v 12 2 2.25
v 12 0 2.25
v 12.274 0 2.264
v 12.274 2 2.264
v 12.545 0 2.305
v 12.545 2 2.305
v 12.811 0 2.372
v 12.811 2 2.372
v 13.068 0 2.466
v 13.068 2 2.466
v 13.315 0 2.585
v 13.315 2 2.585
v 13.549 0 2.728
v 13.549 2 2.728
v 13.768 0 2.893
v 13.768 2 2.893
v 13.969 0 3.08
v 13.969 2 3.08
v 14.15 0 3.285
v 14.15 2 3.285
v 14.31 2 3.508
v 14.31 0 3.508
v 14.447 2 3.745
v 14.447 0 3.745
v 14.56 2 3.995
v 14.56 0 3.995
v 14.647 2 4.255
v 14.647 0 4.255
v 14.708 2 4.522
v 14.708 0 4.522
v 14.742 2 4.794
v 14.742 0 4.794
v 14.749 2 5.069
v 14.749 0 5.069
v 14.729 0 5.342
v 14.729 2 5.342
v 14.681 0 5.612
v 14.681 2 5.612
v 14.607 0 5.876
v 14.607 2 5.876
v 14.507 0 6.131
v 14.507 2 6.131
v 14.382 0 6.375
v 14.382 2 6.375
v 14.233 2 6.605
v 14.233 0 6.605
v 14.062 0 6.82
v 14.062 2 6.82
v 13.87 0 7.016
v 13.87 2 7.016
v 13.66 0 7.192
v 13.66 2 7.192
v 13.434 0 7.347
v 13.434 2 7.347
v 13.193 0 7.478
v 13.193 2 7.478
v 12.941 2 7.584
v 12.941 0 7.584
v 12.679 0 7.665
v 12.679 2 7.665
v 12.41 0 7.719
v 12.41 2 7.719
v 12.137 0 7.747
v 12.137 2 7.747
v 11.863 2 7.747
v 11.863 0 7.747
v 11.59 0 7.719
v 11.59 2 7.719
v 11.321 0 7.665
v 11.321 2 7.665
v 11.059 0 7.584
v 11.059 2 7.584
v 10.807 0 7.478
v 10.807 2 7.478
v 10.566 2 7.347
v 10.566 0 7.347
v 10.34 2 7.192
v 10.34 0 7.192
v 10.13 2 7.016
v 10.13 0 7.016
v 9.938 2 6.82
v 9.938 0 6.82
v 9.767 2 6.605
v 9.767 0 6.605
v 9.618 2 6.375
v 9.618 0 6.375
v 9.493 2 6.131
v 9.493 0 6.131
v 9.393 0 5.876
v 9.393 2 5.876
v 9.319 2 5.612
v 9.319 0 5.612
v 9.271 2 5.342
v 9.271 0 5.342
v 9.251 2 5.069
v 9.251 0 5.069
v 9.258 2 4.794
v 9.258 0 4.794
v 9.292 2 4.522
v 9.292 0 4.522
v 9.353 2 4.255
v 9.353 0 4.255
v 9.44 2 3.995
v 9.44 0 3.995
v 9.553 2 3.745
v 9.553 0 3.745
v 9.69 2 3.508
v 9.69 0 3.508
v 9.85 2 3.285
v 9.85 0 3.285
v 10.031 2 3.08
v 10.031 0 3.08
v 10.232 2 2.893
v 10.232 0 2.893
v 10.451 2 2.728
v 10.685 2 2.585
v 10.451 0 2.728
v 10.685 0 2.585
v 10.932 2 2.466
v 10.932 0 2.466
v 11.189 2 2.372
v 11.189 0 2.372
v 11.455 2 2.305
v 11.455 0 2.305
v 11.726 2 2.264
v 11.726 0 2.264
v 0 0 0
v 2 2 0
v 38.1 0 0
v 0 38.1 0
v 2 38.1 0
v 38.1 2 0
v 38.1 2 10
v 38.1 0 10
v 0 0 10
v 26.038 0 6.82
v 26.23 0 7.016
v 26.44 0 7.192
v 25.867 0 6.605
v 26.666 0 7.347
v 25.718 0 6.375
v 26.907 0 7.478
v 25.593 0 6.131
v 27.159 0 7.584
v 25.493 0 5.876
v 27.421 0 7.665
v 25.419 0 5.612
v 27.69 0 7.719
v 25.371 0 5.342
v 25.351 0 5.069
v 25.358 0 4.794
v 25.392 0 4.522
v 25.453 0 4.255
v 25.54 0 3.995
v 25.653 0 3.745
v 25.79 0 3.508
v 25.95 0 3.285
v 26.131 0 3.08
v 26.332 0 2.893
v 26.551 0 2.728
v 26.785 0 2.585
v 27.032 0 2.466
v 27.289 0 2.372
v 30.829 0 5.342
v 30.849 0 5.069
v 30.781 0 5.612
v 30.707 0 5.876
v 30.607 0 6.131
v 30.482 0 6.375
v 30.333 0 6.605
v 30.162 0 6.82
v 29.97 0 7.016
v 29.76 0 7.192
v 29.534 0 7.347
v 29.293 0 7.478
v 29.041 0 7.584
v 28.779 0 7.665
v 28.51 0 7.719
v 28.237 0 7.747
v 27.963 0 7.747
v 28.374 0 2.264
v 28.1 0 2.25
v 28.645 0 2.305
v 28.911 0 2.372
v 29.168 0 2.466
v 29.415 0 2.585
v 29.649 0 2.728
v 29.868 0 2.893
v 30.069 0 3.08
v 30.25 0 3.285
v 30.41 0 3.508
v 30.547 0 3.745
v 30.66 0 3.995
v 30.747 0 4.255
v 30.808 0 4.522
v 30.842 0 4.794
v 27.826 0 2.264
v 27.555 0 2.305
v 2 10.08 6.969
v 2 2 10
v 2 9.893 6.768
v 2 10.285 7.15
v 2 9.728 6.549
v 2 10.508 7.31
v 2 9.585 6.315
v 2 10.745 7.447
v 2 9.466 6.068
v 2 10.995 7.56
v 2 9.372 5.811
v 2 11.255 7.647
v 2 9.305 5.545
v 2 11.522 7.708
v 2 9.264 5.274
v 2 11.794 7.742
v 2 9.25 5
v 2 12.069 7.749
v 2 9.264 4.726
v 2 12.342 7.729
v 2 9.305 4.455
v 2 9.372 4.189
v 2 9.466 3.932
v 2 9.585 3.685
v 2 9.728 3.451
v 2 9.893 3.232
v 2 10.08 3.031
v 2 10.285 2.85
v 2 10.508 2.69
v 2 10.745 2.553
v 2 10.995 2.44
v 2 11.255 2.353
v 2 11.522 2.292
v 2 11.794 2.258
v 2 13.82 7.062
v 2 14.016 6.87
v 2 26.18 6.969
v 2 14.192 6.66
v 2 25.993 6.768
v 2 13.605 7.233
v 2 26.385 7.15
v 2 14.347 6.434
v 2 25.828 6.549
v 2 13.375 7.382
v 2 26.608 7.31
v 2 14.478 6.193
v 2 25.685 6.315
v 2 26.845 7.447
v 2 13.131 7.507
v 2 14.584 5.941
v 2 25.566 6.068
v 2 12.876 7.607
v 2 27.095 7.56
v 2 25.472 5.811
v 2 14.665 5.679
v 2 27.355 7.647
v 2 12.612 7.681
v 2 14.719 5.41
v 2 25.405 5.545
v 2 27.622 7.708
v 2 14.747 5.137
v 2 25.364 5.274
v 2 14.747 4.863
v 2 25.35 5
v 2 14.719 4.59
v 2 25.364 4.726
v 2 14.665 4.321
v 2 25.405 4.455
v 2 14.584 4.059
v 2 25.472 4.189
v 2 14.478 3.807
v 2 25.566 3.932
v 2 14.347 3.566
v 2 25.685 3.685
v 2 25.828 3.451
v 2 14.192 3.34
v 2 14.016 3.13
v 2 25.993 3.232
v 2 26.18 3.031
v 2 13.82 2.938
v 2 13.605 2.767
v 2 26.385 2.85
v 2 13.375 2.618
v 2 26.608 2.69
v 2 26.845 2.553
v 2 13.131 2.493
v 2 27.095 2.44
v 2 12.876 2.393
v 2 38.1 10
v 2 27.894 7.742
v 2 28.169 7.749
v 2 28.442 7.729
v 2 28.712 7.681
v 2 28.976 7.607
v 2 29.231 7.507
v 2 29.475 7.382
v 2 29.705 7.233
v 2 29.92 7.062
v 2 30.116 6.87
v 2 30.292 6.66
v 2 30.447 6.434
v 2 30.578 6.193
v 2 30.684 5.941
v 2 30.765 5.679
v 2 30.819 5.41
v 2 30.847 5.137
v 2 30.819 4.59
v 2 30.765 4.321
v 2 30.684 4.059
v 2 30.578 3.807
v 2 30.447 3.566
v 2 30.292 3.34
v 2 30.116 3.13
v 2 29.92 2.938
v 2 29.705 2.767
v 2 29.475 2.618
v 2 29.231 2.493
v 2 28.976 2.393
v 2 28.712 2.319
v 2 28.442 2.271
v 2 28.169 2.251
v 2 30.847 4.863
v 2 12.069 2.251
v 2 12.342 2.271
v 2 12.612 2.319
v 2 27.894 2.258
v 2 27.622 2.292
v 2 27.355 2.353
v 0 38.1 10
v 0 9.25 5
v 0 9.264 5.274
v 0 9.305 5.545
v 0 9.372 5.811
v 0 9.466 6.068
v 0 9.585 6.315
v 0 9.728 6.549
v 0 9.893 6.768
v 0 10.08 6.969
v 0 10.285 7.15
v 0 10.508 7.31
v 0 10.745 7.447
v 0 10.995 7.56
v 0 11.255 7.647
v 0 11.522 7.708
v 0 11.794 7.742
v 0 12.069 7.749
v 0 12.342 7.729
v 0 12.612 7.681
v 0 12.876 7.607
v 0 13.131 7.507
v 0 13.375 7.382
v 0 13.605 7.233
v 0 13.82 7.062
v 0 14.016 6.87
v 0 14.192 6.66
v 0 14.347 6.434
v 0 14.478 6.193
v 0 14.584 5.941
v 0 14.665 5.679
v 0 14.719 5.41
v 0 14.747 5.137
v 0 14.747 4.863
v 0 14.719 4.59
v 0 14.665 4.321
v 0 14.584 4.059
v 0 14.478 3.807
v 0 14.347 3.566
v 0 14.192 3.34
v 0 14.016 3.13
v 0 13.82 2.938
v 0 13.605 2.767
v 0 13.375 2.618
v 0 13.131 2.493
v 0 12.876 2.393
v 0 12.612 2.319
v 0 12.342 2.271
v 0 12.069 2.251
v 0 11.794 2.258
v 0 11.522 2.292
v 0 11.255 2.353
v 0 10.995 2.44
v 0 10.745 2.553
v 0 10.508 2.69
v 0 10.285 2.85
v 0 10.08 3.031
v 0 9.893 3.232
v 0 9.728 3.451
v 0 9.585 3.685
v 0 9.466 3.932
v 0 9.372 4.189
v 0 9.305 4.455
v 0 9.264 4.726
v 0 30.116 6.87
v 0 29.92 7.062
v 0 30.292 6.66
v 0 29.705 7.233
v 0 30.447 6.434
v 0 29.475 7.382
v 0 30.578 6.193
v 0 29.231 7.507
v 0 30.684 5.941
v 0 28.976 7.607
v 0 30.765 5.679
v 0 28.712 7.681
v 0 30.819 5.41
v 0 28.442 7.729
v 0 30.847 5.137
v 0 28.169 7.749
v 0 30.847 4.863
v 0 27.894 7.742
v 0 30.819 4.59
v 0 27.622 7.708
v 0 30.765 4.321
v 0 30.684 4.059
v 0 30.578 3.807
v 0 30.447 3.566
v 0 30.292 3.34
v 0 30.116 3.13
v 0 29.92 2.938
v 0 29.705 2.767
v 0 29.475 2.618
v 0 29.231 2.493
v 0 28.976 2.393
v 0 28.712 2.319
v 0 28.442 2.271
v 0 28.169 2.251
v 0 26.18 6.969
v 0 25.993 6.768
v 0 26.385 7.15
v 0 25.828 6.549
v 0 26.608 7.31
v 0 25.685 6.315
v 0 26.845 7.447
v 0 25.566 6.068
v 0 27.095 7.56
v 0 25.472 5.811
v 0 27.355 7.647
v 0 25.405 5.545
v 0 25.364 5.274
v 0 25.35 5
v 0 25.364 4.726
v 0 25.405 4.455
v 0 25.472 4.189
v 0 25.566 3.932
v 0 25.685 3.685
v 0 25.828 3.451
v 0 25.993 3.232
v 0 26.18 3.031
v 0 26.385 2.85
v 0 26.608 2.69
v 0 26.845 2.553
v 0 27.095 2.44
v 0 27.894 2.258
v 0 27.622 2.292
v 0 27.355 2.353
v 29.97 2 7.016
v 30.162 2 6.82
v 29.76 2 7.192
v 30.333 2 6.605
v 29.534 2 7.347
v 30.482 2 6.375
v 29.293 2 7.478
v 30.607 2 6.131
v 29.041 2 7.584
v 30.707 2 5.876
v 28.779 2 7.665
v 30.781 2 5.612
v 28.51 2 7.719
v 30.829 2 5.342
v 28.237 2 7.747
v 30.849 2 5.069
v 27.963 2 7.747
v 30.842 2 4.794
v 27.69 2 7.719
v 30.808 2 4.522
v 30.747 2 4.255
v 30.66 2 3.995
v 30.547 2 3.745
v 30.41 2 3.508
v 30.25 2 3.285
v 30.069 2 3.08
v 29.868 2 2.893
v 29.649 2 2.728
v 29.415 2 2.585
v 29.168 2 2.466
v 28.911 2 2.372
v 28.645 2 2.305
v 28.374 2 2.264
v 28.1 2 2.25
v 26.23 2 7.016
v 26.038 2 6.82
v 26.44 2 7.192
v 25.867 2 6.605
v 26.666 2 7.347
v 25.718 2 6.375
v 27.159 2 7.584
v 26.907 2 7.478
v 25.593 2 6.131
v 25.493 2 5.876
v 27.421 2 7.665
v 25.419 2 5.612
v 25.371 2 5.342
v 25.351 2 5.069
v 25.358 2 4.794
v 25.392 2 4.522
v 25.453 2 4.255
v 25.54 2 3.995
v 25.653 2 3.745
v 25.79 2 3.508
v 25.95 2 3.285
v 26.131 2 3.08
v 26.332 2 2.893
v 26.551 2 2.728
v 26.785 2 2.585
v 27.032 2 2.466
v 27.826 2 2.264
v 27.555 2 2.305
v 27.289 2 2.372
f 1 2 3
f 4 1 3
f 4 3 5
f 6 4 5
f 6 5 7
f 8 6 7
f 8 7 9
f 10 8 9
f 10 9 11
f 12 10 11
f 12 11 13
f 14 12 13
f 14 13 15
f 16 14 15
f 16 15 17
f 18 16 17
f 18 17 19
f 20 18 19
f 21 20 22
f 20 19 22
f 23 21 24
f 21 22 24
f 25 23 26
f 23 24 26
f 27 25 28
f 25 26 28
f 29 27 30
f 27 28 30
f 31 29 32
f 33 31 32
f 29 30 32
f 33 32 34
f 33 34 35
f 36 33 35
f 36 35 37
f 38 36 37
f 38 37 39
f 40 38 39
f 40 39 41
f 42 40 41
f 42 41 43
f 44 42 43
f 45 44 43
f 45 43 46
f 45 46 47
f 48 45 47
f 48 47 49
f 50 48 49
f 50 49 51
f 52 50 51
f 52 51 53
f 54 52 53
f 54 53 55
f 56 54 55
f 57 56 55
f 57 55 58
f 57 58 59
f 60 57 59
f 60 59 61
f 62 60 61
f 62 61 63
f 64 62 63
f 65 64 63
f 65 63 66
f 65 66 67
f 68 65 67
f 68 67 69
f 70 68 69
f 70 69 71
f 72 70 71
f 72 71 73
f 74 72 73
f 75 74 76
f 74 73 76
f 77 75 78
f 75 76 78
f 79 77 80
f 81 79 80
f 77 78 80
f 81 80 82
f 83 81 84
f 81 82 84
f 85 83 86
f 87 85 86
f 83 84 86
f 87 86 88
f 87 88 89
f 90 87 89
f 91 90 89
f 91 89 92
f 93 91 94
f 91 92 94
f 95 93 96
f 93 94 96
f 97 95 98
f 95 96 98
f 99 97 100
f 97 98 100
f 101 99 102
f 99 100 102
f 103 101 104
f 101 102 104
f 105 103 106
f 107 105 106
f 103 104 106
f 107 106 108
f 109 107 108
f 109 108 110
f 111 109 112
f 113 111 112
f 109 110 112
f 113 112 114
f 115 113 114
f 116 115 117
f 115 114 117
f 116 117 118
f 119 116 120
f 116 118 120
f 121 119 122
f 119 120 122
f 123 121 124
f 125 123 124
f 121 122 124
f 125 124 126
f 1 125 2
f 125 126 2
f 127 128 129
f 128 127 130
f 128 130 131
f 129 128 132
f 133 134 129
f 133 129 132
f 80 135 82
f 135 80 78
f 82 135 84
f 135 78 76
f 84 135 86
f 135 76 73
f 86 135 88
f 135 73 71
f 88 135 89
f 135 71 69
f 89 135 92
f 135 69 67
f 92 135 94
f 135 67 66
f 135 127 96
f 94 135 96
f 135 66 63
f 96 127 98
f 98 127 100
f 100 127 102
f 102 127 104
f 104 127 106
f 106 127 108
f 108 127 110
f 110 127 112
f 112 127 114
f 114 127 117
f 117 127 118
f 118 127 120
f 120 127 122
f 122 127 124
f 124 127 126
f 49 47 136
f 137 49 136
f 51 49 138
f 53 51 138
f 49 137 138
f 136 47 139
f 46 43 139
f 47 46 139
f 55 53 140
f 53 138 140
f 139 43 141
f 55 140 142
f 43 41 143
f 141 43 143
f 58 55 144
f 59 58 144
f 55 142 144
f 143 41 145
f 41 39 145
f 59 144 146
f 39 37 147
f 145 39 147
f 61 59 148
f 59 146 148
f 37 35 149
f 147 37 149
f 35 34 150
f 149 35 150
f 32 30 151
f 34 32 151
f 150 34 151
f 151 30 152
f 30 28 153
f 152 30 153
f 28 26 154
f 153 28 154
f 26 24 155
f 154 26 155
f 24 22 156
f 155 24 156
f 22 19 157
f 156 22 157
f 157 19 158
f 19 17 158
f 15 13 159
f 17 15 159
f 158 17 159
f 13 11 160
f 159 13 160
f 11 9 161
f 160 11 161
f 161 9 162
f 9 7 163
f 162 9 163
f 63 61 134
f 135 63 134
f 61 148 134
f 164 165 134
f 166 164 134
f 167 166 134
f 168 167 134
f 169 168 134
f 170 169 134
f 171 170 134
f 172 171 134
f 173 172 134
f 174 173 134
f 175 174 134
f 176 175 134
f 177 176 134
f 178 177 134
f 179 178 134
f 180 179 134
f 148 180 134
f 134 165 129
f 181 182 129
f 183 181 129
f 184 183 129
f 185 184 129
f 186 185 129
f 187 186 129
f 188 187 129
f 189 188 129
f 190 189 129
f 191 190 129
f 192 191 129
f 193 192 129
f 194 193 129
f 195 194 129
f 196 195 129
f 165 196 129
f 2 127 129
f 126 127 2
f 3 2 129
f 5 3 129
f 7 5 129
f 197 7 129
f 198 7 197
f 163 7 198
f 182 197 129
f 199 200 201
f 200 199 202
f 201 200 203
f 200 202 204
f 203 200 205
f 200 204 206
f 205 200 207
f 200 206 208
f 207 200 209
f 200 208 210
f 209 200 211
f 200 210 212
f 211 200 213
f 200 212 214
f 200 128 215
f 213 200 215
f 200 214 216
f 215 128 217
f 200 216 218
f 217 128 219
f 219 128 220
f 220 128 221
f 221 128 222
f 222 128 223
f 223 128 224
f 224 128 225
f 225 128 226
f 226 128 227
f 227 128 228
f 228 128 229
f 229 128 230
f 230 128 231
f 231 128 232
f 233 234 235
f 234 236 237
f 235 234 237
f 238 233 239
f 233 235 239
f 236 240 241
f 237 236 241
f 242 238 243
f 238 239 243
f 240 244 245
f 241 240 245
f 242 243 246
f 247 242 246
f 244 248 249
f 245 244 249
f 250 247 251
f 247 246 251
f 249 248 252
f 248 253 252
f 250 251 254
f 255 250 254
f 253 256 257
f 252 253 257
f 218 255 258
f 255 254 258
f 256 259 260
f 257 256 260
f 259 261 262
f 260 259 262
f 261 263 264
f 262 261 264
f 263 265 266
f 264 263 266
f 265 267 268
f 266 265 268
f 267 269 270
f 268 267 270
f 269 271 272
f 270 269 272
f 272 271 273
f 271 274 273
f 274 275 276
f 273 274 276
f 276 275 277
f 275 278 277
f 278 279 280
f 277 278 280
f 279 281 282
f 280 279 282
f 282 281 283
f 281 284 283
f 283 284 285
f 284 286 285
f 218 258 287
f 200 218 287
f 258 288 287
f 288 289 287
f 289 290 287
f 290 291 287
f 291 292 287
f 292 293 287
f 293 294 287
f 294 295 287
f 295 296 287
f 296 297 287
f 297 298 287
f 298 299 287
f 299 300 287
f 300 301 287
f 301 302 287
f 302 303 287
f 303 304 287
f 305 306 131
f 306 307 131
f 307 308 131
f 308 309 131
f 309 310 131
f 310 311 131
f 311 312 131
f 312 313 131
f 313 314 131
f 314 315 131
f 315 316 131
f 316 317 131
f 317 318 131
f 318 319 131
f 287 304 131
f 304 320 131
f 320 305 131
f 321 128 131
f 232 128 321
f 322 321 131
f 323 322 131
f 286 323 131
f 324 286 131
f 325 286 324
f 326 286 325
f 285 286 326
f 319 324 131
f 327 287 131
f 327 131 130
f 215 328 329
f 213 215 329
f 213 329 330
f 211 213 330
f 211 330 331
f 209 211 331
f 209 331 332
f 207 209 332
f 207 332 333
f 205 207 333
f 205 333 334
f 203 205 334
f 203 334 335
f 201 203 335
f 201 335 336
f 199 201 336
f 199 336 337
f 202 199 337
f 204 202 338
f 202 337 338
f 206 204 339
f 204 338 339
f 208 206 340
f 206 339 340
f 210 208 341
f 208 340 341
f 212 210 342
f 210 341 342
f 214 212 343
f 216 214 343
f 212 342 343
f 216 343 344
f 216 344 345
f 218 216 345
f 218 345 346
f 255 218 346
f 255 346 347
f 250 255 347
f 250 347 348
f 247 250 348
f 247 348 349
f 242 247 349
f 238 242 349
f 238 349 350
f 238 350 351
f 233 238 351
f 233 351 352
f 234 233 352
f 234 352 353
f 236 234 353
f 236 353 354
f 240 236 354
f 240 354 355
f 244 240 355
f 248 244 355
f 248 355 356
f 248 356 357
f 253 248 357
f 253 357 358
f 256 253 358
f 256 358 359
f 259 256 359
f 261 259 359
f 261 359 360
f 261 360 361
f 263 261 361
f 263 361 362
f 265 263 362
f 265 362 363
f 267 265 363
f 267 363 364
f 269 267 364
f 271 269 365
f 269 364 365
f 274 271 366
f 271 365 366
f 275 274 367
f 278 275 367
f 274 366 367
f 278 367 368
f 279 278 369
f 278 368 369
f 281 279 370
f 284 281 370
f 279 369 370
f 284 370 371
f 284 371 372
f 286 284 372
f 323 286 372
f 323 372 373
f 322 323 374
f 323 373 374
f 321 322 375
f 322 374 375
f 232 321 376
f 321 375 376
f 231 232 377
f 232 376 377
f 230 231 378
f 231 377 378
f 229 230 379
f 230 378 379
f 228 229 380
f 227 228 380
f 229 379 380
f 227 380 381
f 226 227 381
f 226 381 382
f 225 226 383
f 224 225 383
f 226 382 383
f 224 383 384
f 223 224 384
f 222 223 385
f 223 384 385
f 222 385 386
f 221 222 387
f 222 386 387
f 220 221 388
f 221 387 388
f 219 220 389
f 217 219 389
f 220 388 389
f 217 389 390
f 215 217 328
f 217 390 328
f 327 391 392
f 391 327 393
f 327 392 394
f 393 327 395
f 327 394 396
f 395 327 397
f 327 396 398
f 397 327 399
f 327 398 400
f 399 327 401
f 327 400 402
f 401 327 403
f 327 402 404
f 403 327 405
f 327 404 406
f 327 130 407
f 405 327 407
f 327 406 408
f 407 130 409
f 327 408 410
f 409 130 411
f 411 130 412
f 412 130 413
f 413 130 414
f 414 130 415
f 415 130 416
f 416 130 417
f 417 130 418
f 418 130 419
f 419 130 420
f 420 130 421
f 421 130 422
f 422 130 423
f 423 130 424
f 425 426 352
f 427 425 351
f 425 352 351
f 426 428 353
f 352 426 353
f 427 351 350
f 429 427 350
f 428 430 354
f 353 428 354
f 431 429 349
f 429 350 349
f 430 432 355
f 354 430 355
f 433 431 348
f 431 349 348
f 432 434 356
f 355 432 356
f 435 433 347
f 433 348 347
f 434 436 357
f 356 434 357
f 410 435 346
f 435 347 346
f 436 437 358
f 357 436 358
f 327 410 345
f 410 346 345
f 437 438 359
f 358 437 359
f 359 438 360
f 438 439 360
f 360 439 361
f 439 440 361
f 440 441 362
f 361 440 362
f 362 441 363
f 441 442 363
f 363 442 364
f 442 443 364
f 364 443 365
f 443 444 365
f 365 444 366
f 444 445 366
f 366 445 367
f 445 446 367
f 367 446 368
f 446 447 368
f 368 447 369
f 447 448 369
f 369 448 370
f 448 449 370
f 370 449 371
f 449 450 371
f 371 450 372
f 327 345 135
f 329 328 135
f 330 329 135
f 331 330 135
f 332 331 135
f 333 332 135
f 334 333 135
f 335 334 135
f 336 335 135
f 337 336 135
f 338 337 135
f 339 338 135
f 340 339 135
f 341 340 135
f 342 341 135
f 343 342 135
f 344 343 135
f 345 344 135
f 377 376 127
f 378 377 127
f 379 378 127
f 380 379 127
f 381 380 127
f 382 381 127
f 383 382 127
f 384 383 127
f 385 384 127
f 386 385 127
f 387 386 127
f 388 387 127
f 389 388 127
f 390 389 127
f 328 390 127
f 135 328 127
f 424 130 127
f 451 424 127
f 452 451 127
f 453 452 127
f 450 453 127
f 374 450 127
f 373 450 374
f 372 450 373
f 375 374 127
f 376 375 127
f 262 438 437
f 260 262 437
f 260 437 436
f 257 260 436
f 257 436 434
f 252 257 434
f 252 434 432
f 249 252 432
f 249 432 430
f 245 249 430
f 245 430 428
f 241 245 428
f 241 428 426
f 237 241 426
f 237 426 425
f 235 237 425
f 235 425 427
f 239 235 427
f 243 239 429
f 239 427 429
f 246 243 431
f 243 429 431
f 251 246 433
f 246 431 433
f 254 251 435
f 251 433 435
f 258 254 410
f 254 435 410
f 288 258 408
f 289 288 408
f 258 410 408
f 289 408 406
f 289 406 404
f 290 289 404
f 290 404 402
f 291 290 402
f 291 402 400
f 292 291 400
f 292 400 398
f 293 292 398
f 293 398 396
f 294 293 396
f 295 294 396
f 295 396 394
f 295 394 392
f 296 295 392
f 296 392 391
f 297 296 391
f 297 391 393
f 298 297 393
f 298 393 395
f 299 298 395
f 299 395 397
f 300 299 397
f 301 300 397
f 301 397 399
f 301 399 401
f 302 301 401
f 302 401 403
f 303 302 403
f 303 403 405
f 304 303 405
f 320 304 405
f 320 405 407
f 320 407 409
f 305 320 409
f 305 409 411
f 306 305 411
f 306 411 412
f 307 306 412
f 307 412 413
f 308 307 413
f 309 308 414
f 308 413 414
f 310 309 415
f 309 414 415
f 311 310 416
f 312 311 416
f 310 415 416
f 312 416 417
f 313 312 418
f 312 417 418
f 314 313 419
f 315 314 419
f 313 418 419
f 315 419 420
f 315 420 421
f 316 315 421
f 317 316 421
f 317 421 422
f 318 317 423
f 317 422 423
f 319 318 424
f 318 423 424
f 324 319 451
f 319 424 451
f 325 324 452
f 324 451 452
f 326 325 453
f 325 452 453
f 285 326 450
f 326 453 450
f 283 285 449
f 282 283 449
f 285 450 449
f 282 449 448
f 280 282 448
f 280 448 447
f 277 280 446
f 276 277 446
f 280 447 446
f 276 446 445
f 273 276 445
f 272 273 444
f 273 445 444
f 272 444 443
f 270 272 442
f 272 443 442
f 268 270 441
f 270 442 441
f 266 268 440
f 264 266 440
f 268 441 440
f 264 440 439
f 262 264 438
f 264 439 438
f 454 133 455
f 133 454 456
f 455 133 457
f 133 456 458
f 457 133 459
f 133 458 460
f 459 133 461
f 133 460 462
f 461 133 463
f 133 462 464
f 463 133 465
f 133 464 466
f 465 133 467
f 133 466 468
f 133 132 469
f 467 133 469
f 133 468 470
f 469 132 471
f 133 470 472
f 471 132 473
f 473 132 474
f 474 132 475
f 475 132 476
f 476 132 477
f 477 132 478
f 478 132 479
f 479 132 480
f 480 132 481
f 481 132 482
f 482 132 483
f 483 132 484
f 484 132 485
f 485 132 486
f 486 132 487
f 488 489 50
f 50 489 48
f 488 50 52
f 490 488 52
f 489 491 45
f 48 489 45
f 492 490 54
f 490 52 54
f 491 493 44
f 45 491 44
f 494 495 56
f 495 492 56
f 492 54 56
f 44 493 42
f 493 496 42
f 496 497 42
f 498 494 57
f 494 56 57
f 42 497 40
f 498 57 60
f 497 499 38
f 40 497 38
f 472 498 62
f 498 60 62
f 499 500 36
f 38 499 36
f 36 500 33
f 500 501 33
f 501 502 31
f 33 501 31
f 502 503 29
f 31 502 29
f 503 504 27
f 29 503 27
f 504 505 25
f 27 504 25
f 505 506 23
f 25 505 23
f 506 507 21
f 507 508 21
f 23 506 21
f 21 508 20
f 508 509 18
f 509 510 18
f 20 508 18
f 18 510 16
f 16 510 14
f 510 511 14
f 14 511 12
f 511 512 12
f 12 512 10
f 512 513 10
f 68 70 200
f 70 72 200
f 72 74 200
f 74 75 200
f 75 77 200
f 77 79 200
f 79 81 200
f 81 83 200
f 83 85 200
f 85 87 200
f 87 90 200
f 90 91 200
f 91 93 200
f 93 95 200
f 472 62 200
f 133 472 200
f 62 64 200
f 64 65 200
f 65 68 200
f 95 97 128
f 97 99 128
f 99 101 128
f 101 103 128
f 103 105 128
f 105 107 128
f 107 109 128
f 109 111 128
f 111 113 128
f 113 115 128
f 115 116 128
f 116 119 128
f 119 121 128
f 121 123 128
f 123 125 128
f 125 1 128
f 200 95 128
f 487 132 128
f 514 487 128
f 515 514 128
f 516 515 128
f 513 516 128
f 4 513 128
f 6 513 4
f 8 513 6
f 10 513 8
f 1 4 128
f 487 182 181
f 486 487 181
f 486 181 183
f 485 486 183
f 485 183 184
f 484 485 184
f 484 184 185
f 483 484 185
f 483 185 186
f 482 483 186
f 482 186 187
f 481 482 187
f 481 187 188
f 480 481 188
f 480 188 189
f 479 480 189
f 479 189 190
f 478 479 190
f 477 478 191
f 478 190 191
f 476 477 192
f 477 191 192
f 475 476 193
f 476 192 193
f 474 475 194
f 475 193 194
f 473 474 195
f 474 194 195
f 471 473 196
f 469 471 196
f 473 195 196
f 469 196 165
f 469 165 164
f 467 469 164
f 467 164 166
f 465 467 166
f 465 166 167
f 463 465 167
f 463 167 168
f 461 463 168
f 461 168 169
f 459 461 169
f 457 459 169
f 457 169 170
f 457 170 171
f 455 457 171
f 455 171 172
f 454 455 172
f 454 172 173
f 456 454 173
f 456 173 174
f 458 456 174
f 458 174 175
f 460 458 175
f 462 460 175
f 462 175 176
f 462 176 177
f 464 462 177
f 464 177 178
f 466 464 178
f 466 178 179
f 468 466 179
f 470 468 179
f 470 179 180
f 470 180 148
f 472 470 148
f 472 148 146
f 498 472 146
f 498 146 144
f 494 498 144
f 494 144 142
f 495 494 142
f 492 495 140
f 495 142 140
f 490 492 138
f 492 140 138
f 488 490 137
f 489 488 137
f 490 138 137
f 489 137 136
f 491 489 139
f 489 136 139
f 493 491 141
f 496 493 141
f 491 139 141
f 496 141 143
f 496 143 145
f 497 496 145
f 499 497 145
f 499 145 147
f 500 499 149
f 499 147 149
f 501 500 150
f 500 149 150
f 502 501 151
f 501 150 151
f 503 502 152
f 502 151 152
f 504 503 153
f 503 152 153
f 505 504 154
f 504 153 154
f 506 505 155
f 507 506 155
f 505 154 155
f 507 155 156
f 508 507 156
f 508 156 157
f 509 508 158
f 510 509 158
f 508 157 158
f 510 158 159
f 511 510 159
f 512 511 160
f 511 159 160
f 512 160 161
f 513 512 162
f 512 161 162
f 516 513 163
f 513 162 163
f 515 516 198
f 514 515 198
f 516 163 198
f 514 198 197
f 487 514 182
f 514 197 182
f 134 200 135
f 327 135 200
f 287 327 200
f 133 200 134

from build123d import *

# Parameters (mm, degrees)
BOSS_EXTRUDE1_DEPTH            = 10
M5_CLEARANCE_HOLE4_D           = 5.5
M5_CLEARANCE_HOLE4_ON_FACE_2_D = 5.5


with BuildPart() as part:
    # Sketch1 → Boss-Extrude1 (new body)
    with BuildSketch(Plane.XY):
        Polygon((0, 0), (38.1, 0), (38.1, 2), (2, 2), (2, 38.1), (0, 38.1), align=None)
    extrude(amount=BOSS_EXTRUDE1_DEPTH)

    # M5 Clearance Hole4 (through all)
    with Locations(Plane(origin=(2, 12, 5), x_dir=(0, 1, 0), z_dir=(1, 0, 0))):
        with Locations((0, 0), (16.1, 0)):
            Hole(M5_CLEARANCE_HOLE4_D / 2)

    # M5 Clearance Hole4 on face 2 (through all)
    with Locations(Plane(origin=(12, 2, 5), x_dir=(0, 0, 1), z_dir=(0, 1, 0))):
        with Locations((0, 0), (0, 16.1)):
            Hole(M5_CLEARANCE_HOLE4_ON_FACE_2_D / 2)


solid = part.part
